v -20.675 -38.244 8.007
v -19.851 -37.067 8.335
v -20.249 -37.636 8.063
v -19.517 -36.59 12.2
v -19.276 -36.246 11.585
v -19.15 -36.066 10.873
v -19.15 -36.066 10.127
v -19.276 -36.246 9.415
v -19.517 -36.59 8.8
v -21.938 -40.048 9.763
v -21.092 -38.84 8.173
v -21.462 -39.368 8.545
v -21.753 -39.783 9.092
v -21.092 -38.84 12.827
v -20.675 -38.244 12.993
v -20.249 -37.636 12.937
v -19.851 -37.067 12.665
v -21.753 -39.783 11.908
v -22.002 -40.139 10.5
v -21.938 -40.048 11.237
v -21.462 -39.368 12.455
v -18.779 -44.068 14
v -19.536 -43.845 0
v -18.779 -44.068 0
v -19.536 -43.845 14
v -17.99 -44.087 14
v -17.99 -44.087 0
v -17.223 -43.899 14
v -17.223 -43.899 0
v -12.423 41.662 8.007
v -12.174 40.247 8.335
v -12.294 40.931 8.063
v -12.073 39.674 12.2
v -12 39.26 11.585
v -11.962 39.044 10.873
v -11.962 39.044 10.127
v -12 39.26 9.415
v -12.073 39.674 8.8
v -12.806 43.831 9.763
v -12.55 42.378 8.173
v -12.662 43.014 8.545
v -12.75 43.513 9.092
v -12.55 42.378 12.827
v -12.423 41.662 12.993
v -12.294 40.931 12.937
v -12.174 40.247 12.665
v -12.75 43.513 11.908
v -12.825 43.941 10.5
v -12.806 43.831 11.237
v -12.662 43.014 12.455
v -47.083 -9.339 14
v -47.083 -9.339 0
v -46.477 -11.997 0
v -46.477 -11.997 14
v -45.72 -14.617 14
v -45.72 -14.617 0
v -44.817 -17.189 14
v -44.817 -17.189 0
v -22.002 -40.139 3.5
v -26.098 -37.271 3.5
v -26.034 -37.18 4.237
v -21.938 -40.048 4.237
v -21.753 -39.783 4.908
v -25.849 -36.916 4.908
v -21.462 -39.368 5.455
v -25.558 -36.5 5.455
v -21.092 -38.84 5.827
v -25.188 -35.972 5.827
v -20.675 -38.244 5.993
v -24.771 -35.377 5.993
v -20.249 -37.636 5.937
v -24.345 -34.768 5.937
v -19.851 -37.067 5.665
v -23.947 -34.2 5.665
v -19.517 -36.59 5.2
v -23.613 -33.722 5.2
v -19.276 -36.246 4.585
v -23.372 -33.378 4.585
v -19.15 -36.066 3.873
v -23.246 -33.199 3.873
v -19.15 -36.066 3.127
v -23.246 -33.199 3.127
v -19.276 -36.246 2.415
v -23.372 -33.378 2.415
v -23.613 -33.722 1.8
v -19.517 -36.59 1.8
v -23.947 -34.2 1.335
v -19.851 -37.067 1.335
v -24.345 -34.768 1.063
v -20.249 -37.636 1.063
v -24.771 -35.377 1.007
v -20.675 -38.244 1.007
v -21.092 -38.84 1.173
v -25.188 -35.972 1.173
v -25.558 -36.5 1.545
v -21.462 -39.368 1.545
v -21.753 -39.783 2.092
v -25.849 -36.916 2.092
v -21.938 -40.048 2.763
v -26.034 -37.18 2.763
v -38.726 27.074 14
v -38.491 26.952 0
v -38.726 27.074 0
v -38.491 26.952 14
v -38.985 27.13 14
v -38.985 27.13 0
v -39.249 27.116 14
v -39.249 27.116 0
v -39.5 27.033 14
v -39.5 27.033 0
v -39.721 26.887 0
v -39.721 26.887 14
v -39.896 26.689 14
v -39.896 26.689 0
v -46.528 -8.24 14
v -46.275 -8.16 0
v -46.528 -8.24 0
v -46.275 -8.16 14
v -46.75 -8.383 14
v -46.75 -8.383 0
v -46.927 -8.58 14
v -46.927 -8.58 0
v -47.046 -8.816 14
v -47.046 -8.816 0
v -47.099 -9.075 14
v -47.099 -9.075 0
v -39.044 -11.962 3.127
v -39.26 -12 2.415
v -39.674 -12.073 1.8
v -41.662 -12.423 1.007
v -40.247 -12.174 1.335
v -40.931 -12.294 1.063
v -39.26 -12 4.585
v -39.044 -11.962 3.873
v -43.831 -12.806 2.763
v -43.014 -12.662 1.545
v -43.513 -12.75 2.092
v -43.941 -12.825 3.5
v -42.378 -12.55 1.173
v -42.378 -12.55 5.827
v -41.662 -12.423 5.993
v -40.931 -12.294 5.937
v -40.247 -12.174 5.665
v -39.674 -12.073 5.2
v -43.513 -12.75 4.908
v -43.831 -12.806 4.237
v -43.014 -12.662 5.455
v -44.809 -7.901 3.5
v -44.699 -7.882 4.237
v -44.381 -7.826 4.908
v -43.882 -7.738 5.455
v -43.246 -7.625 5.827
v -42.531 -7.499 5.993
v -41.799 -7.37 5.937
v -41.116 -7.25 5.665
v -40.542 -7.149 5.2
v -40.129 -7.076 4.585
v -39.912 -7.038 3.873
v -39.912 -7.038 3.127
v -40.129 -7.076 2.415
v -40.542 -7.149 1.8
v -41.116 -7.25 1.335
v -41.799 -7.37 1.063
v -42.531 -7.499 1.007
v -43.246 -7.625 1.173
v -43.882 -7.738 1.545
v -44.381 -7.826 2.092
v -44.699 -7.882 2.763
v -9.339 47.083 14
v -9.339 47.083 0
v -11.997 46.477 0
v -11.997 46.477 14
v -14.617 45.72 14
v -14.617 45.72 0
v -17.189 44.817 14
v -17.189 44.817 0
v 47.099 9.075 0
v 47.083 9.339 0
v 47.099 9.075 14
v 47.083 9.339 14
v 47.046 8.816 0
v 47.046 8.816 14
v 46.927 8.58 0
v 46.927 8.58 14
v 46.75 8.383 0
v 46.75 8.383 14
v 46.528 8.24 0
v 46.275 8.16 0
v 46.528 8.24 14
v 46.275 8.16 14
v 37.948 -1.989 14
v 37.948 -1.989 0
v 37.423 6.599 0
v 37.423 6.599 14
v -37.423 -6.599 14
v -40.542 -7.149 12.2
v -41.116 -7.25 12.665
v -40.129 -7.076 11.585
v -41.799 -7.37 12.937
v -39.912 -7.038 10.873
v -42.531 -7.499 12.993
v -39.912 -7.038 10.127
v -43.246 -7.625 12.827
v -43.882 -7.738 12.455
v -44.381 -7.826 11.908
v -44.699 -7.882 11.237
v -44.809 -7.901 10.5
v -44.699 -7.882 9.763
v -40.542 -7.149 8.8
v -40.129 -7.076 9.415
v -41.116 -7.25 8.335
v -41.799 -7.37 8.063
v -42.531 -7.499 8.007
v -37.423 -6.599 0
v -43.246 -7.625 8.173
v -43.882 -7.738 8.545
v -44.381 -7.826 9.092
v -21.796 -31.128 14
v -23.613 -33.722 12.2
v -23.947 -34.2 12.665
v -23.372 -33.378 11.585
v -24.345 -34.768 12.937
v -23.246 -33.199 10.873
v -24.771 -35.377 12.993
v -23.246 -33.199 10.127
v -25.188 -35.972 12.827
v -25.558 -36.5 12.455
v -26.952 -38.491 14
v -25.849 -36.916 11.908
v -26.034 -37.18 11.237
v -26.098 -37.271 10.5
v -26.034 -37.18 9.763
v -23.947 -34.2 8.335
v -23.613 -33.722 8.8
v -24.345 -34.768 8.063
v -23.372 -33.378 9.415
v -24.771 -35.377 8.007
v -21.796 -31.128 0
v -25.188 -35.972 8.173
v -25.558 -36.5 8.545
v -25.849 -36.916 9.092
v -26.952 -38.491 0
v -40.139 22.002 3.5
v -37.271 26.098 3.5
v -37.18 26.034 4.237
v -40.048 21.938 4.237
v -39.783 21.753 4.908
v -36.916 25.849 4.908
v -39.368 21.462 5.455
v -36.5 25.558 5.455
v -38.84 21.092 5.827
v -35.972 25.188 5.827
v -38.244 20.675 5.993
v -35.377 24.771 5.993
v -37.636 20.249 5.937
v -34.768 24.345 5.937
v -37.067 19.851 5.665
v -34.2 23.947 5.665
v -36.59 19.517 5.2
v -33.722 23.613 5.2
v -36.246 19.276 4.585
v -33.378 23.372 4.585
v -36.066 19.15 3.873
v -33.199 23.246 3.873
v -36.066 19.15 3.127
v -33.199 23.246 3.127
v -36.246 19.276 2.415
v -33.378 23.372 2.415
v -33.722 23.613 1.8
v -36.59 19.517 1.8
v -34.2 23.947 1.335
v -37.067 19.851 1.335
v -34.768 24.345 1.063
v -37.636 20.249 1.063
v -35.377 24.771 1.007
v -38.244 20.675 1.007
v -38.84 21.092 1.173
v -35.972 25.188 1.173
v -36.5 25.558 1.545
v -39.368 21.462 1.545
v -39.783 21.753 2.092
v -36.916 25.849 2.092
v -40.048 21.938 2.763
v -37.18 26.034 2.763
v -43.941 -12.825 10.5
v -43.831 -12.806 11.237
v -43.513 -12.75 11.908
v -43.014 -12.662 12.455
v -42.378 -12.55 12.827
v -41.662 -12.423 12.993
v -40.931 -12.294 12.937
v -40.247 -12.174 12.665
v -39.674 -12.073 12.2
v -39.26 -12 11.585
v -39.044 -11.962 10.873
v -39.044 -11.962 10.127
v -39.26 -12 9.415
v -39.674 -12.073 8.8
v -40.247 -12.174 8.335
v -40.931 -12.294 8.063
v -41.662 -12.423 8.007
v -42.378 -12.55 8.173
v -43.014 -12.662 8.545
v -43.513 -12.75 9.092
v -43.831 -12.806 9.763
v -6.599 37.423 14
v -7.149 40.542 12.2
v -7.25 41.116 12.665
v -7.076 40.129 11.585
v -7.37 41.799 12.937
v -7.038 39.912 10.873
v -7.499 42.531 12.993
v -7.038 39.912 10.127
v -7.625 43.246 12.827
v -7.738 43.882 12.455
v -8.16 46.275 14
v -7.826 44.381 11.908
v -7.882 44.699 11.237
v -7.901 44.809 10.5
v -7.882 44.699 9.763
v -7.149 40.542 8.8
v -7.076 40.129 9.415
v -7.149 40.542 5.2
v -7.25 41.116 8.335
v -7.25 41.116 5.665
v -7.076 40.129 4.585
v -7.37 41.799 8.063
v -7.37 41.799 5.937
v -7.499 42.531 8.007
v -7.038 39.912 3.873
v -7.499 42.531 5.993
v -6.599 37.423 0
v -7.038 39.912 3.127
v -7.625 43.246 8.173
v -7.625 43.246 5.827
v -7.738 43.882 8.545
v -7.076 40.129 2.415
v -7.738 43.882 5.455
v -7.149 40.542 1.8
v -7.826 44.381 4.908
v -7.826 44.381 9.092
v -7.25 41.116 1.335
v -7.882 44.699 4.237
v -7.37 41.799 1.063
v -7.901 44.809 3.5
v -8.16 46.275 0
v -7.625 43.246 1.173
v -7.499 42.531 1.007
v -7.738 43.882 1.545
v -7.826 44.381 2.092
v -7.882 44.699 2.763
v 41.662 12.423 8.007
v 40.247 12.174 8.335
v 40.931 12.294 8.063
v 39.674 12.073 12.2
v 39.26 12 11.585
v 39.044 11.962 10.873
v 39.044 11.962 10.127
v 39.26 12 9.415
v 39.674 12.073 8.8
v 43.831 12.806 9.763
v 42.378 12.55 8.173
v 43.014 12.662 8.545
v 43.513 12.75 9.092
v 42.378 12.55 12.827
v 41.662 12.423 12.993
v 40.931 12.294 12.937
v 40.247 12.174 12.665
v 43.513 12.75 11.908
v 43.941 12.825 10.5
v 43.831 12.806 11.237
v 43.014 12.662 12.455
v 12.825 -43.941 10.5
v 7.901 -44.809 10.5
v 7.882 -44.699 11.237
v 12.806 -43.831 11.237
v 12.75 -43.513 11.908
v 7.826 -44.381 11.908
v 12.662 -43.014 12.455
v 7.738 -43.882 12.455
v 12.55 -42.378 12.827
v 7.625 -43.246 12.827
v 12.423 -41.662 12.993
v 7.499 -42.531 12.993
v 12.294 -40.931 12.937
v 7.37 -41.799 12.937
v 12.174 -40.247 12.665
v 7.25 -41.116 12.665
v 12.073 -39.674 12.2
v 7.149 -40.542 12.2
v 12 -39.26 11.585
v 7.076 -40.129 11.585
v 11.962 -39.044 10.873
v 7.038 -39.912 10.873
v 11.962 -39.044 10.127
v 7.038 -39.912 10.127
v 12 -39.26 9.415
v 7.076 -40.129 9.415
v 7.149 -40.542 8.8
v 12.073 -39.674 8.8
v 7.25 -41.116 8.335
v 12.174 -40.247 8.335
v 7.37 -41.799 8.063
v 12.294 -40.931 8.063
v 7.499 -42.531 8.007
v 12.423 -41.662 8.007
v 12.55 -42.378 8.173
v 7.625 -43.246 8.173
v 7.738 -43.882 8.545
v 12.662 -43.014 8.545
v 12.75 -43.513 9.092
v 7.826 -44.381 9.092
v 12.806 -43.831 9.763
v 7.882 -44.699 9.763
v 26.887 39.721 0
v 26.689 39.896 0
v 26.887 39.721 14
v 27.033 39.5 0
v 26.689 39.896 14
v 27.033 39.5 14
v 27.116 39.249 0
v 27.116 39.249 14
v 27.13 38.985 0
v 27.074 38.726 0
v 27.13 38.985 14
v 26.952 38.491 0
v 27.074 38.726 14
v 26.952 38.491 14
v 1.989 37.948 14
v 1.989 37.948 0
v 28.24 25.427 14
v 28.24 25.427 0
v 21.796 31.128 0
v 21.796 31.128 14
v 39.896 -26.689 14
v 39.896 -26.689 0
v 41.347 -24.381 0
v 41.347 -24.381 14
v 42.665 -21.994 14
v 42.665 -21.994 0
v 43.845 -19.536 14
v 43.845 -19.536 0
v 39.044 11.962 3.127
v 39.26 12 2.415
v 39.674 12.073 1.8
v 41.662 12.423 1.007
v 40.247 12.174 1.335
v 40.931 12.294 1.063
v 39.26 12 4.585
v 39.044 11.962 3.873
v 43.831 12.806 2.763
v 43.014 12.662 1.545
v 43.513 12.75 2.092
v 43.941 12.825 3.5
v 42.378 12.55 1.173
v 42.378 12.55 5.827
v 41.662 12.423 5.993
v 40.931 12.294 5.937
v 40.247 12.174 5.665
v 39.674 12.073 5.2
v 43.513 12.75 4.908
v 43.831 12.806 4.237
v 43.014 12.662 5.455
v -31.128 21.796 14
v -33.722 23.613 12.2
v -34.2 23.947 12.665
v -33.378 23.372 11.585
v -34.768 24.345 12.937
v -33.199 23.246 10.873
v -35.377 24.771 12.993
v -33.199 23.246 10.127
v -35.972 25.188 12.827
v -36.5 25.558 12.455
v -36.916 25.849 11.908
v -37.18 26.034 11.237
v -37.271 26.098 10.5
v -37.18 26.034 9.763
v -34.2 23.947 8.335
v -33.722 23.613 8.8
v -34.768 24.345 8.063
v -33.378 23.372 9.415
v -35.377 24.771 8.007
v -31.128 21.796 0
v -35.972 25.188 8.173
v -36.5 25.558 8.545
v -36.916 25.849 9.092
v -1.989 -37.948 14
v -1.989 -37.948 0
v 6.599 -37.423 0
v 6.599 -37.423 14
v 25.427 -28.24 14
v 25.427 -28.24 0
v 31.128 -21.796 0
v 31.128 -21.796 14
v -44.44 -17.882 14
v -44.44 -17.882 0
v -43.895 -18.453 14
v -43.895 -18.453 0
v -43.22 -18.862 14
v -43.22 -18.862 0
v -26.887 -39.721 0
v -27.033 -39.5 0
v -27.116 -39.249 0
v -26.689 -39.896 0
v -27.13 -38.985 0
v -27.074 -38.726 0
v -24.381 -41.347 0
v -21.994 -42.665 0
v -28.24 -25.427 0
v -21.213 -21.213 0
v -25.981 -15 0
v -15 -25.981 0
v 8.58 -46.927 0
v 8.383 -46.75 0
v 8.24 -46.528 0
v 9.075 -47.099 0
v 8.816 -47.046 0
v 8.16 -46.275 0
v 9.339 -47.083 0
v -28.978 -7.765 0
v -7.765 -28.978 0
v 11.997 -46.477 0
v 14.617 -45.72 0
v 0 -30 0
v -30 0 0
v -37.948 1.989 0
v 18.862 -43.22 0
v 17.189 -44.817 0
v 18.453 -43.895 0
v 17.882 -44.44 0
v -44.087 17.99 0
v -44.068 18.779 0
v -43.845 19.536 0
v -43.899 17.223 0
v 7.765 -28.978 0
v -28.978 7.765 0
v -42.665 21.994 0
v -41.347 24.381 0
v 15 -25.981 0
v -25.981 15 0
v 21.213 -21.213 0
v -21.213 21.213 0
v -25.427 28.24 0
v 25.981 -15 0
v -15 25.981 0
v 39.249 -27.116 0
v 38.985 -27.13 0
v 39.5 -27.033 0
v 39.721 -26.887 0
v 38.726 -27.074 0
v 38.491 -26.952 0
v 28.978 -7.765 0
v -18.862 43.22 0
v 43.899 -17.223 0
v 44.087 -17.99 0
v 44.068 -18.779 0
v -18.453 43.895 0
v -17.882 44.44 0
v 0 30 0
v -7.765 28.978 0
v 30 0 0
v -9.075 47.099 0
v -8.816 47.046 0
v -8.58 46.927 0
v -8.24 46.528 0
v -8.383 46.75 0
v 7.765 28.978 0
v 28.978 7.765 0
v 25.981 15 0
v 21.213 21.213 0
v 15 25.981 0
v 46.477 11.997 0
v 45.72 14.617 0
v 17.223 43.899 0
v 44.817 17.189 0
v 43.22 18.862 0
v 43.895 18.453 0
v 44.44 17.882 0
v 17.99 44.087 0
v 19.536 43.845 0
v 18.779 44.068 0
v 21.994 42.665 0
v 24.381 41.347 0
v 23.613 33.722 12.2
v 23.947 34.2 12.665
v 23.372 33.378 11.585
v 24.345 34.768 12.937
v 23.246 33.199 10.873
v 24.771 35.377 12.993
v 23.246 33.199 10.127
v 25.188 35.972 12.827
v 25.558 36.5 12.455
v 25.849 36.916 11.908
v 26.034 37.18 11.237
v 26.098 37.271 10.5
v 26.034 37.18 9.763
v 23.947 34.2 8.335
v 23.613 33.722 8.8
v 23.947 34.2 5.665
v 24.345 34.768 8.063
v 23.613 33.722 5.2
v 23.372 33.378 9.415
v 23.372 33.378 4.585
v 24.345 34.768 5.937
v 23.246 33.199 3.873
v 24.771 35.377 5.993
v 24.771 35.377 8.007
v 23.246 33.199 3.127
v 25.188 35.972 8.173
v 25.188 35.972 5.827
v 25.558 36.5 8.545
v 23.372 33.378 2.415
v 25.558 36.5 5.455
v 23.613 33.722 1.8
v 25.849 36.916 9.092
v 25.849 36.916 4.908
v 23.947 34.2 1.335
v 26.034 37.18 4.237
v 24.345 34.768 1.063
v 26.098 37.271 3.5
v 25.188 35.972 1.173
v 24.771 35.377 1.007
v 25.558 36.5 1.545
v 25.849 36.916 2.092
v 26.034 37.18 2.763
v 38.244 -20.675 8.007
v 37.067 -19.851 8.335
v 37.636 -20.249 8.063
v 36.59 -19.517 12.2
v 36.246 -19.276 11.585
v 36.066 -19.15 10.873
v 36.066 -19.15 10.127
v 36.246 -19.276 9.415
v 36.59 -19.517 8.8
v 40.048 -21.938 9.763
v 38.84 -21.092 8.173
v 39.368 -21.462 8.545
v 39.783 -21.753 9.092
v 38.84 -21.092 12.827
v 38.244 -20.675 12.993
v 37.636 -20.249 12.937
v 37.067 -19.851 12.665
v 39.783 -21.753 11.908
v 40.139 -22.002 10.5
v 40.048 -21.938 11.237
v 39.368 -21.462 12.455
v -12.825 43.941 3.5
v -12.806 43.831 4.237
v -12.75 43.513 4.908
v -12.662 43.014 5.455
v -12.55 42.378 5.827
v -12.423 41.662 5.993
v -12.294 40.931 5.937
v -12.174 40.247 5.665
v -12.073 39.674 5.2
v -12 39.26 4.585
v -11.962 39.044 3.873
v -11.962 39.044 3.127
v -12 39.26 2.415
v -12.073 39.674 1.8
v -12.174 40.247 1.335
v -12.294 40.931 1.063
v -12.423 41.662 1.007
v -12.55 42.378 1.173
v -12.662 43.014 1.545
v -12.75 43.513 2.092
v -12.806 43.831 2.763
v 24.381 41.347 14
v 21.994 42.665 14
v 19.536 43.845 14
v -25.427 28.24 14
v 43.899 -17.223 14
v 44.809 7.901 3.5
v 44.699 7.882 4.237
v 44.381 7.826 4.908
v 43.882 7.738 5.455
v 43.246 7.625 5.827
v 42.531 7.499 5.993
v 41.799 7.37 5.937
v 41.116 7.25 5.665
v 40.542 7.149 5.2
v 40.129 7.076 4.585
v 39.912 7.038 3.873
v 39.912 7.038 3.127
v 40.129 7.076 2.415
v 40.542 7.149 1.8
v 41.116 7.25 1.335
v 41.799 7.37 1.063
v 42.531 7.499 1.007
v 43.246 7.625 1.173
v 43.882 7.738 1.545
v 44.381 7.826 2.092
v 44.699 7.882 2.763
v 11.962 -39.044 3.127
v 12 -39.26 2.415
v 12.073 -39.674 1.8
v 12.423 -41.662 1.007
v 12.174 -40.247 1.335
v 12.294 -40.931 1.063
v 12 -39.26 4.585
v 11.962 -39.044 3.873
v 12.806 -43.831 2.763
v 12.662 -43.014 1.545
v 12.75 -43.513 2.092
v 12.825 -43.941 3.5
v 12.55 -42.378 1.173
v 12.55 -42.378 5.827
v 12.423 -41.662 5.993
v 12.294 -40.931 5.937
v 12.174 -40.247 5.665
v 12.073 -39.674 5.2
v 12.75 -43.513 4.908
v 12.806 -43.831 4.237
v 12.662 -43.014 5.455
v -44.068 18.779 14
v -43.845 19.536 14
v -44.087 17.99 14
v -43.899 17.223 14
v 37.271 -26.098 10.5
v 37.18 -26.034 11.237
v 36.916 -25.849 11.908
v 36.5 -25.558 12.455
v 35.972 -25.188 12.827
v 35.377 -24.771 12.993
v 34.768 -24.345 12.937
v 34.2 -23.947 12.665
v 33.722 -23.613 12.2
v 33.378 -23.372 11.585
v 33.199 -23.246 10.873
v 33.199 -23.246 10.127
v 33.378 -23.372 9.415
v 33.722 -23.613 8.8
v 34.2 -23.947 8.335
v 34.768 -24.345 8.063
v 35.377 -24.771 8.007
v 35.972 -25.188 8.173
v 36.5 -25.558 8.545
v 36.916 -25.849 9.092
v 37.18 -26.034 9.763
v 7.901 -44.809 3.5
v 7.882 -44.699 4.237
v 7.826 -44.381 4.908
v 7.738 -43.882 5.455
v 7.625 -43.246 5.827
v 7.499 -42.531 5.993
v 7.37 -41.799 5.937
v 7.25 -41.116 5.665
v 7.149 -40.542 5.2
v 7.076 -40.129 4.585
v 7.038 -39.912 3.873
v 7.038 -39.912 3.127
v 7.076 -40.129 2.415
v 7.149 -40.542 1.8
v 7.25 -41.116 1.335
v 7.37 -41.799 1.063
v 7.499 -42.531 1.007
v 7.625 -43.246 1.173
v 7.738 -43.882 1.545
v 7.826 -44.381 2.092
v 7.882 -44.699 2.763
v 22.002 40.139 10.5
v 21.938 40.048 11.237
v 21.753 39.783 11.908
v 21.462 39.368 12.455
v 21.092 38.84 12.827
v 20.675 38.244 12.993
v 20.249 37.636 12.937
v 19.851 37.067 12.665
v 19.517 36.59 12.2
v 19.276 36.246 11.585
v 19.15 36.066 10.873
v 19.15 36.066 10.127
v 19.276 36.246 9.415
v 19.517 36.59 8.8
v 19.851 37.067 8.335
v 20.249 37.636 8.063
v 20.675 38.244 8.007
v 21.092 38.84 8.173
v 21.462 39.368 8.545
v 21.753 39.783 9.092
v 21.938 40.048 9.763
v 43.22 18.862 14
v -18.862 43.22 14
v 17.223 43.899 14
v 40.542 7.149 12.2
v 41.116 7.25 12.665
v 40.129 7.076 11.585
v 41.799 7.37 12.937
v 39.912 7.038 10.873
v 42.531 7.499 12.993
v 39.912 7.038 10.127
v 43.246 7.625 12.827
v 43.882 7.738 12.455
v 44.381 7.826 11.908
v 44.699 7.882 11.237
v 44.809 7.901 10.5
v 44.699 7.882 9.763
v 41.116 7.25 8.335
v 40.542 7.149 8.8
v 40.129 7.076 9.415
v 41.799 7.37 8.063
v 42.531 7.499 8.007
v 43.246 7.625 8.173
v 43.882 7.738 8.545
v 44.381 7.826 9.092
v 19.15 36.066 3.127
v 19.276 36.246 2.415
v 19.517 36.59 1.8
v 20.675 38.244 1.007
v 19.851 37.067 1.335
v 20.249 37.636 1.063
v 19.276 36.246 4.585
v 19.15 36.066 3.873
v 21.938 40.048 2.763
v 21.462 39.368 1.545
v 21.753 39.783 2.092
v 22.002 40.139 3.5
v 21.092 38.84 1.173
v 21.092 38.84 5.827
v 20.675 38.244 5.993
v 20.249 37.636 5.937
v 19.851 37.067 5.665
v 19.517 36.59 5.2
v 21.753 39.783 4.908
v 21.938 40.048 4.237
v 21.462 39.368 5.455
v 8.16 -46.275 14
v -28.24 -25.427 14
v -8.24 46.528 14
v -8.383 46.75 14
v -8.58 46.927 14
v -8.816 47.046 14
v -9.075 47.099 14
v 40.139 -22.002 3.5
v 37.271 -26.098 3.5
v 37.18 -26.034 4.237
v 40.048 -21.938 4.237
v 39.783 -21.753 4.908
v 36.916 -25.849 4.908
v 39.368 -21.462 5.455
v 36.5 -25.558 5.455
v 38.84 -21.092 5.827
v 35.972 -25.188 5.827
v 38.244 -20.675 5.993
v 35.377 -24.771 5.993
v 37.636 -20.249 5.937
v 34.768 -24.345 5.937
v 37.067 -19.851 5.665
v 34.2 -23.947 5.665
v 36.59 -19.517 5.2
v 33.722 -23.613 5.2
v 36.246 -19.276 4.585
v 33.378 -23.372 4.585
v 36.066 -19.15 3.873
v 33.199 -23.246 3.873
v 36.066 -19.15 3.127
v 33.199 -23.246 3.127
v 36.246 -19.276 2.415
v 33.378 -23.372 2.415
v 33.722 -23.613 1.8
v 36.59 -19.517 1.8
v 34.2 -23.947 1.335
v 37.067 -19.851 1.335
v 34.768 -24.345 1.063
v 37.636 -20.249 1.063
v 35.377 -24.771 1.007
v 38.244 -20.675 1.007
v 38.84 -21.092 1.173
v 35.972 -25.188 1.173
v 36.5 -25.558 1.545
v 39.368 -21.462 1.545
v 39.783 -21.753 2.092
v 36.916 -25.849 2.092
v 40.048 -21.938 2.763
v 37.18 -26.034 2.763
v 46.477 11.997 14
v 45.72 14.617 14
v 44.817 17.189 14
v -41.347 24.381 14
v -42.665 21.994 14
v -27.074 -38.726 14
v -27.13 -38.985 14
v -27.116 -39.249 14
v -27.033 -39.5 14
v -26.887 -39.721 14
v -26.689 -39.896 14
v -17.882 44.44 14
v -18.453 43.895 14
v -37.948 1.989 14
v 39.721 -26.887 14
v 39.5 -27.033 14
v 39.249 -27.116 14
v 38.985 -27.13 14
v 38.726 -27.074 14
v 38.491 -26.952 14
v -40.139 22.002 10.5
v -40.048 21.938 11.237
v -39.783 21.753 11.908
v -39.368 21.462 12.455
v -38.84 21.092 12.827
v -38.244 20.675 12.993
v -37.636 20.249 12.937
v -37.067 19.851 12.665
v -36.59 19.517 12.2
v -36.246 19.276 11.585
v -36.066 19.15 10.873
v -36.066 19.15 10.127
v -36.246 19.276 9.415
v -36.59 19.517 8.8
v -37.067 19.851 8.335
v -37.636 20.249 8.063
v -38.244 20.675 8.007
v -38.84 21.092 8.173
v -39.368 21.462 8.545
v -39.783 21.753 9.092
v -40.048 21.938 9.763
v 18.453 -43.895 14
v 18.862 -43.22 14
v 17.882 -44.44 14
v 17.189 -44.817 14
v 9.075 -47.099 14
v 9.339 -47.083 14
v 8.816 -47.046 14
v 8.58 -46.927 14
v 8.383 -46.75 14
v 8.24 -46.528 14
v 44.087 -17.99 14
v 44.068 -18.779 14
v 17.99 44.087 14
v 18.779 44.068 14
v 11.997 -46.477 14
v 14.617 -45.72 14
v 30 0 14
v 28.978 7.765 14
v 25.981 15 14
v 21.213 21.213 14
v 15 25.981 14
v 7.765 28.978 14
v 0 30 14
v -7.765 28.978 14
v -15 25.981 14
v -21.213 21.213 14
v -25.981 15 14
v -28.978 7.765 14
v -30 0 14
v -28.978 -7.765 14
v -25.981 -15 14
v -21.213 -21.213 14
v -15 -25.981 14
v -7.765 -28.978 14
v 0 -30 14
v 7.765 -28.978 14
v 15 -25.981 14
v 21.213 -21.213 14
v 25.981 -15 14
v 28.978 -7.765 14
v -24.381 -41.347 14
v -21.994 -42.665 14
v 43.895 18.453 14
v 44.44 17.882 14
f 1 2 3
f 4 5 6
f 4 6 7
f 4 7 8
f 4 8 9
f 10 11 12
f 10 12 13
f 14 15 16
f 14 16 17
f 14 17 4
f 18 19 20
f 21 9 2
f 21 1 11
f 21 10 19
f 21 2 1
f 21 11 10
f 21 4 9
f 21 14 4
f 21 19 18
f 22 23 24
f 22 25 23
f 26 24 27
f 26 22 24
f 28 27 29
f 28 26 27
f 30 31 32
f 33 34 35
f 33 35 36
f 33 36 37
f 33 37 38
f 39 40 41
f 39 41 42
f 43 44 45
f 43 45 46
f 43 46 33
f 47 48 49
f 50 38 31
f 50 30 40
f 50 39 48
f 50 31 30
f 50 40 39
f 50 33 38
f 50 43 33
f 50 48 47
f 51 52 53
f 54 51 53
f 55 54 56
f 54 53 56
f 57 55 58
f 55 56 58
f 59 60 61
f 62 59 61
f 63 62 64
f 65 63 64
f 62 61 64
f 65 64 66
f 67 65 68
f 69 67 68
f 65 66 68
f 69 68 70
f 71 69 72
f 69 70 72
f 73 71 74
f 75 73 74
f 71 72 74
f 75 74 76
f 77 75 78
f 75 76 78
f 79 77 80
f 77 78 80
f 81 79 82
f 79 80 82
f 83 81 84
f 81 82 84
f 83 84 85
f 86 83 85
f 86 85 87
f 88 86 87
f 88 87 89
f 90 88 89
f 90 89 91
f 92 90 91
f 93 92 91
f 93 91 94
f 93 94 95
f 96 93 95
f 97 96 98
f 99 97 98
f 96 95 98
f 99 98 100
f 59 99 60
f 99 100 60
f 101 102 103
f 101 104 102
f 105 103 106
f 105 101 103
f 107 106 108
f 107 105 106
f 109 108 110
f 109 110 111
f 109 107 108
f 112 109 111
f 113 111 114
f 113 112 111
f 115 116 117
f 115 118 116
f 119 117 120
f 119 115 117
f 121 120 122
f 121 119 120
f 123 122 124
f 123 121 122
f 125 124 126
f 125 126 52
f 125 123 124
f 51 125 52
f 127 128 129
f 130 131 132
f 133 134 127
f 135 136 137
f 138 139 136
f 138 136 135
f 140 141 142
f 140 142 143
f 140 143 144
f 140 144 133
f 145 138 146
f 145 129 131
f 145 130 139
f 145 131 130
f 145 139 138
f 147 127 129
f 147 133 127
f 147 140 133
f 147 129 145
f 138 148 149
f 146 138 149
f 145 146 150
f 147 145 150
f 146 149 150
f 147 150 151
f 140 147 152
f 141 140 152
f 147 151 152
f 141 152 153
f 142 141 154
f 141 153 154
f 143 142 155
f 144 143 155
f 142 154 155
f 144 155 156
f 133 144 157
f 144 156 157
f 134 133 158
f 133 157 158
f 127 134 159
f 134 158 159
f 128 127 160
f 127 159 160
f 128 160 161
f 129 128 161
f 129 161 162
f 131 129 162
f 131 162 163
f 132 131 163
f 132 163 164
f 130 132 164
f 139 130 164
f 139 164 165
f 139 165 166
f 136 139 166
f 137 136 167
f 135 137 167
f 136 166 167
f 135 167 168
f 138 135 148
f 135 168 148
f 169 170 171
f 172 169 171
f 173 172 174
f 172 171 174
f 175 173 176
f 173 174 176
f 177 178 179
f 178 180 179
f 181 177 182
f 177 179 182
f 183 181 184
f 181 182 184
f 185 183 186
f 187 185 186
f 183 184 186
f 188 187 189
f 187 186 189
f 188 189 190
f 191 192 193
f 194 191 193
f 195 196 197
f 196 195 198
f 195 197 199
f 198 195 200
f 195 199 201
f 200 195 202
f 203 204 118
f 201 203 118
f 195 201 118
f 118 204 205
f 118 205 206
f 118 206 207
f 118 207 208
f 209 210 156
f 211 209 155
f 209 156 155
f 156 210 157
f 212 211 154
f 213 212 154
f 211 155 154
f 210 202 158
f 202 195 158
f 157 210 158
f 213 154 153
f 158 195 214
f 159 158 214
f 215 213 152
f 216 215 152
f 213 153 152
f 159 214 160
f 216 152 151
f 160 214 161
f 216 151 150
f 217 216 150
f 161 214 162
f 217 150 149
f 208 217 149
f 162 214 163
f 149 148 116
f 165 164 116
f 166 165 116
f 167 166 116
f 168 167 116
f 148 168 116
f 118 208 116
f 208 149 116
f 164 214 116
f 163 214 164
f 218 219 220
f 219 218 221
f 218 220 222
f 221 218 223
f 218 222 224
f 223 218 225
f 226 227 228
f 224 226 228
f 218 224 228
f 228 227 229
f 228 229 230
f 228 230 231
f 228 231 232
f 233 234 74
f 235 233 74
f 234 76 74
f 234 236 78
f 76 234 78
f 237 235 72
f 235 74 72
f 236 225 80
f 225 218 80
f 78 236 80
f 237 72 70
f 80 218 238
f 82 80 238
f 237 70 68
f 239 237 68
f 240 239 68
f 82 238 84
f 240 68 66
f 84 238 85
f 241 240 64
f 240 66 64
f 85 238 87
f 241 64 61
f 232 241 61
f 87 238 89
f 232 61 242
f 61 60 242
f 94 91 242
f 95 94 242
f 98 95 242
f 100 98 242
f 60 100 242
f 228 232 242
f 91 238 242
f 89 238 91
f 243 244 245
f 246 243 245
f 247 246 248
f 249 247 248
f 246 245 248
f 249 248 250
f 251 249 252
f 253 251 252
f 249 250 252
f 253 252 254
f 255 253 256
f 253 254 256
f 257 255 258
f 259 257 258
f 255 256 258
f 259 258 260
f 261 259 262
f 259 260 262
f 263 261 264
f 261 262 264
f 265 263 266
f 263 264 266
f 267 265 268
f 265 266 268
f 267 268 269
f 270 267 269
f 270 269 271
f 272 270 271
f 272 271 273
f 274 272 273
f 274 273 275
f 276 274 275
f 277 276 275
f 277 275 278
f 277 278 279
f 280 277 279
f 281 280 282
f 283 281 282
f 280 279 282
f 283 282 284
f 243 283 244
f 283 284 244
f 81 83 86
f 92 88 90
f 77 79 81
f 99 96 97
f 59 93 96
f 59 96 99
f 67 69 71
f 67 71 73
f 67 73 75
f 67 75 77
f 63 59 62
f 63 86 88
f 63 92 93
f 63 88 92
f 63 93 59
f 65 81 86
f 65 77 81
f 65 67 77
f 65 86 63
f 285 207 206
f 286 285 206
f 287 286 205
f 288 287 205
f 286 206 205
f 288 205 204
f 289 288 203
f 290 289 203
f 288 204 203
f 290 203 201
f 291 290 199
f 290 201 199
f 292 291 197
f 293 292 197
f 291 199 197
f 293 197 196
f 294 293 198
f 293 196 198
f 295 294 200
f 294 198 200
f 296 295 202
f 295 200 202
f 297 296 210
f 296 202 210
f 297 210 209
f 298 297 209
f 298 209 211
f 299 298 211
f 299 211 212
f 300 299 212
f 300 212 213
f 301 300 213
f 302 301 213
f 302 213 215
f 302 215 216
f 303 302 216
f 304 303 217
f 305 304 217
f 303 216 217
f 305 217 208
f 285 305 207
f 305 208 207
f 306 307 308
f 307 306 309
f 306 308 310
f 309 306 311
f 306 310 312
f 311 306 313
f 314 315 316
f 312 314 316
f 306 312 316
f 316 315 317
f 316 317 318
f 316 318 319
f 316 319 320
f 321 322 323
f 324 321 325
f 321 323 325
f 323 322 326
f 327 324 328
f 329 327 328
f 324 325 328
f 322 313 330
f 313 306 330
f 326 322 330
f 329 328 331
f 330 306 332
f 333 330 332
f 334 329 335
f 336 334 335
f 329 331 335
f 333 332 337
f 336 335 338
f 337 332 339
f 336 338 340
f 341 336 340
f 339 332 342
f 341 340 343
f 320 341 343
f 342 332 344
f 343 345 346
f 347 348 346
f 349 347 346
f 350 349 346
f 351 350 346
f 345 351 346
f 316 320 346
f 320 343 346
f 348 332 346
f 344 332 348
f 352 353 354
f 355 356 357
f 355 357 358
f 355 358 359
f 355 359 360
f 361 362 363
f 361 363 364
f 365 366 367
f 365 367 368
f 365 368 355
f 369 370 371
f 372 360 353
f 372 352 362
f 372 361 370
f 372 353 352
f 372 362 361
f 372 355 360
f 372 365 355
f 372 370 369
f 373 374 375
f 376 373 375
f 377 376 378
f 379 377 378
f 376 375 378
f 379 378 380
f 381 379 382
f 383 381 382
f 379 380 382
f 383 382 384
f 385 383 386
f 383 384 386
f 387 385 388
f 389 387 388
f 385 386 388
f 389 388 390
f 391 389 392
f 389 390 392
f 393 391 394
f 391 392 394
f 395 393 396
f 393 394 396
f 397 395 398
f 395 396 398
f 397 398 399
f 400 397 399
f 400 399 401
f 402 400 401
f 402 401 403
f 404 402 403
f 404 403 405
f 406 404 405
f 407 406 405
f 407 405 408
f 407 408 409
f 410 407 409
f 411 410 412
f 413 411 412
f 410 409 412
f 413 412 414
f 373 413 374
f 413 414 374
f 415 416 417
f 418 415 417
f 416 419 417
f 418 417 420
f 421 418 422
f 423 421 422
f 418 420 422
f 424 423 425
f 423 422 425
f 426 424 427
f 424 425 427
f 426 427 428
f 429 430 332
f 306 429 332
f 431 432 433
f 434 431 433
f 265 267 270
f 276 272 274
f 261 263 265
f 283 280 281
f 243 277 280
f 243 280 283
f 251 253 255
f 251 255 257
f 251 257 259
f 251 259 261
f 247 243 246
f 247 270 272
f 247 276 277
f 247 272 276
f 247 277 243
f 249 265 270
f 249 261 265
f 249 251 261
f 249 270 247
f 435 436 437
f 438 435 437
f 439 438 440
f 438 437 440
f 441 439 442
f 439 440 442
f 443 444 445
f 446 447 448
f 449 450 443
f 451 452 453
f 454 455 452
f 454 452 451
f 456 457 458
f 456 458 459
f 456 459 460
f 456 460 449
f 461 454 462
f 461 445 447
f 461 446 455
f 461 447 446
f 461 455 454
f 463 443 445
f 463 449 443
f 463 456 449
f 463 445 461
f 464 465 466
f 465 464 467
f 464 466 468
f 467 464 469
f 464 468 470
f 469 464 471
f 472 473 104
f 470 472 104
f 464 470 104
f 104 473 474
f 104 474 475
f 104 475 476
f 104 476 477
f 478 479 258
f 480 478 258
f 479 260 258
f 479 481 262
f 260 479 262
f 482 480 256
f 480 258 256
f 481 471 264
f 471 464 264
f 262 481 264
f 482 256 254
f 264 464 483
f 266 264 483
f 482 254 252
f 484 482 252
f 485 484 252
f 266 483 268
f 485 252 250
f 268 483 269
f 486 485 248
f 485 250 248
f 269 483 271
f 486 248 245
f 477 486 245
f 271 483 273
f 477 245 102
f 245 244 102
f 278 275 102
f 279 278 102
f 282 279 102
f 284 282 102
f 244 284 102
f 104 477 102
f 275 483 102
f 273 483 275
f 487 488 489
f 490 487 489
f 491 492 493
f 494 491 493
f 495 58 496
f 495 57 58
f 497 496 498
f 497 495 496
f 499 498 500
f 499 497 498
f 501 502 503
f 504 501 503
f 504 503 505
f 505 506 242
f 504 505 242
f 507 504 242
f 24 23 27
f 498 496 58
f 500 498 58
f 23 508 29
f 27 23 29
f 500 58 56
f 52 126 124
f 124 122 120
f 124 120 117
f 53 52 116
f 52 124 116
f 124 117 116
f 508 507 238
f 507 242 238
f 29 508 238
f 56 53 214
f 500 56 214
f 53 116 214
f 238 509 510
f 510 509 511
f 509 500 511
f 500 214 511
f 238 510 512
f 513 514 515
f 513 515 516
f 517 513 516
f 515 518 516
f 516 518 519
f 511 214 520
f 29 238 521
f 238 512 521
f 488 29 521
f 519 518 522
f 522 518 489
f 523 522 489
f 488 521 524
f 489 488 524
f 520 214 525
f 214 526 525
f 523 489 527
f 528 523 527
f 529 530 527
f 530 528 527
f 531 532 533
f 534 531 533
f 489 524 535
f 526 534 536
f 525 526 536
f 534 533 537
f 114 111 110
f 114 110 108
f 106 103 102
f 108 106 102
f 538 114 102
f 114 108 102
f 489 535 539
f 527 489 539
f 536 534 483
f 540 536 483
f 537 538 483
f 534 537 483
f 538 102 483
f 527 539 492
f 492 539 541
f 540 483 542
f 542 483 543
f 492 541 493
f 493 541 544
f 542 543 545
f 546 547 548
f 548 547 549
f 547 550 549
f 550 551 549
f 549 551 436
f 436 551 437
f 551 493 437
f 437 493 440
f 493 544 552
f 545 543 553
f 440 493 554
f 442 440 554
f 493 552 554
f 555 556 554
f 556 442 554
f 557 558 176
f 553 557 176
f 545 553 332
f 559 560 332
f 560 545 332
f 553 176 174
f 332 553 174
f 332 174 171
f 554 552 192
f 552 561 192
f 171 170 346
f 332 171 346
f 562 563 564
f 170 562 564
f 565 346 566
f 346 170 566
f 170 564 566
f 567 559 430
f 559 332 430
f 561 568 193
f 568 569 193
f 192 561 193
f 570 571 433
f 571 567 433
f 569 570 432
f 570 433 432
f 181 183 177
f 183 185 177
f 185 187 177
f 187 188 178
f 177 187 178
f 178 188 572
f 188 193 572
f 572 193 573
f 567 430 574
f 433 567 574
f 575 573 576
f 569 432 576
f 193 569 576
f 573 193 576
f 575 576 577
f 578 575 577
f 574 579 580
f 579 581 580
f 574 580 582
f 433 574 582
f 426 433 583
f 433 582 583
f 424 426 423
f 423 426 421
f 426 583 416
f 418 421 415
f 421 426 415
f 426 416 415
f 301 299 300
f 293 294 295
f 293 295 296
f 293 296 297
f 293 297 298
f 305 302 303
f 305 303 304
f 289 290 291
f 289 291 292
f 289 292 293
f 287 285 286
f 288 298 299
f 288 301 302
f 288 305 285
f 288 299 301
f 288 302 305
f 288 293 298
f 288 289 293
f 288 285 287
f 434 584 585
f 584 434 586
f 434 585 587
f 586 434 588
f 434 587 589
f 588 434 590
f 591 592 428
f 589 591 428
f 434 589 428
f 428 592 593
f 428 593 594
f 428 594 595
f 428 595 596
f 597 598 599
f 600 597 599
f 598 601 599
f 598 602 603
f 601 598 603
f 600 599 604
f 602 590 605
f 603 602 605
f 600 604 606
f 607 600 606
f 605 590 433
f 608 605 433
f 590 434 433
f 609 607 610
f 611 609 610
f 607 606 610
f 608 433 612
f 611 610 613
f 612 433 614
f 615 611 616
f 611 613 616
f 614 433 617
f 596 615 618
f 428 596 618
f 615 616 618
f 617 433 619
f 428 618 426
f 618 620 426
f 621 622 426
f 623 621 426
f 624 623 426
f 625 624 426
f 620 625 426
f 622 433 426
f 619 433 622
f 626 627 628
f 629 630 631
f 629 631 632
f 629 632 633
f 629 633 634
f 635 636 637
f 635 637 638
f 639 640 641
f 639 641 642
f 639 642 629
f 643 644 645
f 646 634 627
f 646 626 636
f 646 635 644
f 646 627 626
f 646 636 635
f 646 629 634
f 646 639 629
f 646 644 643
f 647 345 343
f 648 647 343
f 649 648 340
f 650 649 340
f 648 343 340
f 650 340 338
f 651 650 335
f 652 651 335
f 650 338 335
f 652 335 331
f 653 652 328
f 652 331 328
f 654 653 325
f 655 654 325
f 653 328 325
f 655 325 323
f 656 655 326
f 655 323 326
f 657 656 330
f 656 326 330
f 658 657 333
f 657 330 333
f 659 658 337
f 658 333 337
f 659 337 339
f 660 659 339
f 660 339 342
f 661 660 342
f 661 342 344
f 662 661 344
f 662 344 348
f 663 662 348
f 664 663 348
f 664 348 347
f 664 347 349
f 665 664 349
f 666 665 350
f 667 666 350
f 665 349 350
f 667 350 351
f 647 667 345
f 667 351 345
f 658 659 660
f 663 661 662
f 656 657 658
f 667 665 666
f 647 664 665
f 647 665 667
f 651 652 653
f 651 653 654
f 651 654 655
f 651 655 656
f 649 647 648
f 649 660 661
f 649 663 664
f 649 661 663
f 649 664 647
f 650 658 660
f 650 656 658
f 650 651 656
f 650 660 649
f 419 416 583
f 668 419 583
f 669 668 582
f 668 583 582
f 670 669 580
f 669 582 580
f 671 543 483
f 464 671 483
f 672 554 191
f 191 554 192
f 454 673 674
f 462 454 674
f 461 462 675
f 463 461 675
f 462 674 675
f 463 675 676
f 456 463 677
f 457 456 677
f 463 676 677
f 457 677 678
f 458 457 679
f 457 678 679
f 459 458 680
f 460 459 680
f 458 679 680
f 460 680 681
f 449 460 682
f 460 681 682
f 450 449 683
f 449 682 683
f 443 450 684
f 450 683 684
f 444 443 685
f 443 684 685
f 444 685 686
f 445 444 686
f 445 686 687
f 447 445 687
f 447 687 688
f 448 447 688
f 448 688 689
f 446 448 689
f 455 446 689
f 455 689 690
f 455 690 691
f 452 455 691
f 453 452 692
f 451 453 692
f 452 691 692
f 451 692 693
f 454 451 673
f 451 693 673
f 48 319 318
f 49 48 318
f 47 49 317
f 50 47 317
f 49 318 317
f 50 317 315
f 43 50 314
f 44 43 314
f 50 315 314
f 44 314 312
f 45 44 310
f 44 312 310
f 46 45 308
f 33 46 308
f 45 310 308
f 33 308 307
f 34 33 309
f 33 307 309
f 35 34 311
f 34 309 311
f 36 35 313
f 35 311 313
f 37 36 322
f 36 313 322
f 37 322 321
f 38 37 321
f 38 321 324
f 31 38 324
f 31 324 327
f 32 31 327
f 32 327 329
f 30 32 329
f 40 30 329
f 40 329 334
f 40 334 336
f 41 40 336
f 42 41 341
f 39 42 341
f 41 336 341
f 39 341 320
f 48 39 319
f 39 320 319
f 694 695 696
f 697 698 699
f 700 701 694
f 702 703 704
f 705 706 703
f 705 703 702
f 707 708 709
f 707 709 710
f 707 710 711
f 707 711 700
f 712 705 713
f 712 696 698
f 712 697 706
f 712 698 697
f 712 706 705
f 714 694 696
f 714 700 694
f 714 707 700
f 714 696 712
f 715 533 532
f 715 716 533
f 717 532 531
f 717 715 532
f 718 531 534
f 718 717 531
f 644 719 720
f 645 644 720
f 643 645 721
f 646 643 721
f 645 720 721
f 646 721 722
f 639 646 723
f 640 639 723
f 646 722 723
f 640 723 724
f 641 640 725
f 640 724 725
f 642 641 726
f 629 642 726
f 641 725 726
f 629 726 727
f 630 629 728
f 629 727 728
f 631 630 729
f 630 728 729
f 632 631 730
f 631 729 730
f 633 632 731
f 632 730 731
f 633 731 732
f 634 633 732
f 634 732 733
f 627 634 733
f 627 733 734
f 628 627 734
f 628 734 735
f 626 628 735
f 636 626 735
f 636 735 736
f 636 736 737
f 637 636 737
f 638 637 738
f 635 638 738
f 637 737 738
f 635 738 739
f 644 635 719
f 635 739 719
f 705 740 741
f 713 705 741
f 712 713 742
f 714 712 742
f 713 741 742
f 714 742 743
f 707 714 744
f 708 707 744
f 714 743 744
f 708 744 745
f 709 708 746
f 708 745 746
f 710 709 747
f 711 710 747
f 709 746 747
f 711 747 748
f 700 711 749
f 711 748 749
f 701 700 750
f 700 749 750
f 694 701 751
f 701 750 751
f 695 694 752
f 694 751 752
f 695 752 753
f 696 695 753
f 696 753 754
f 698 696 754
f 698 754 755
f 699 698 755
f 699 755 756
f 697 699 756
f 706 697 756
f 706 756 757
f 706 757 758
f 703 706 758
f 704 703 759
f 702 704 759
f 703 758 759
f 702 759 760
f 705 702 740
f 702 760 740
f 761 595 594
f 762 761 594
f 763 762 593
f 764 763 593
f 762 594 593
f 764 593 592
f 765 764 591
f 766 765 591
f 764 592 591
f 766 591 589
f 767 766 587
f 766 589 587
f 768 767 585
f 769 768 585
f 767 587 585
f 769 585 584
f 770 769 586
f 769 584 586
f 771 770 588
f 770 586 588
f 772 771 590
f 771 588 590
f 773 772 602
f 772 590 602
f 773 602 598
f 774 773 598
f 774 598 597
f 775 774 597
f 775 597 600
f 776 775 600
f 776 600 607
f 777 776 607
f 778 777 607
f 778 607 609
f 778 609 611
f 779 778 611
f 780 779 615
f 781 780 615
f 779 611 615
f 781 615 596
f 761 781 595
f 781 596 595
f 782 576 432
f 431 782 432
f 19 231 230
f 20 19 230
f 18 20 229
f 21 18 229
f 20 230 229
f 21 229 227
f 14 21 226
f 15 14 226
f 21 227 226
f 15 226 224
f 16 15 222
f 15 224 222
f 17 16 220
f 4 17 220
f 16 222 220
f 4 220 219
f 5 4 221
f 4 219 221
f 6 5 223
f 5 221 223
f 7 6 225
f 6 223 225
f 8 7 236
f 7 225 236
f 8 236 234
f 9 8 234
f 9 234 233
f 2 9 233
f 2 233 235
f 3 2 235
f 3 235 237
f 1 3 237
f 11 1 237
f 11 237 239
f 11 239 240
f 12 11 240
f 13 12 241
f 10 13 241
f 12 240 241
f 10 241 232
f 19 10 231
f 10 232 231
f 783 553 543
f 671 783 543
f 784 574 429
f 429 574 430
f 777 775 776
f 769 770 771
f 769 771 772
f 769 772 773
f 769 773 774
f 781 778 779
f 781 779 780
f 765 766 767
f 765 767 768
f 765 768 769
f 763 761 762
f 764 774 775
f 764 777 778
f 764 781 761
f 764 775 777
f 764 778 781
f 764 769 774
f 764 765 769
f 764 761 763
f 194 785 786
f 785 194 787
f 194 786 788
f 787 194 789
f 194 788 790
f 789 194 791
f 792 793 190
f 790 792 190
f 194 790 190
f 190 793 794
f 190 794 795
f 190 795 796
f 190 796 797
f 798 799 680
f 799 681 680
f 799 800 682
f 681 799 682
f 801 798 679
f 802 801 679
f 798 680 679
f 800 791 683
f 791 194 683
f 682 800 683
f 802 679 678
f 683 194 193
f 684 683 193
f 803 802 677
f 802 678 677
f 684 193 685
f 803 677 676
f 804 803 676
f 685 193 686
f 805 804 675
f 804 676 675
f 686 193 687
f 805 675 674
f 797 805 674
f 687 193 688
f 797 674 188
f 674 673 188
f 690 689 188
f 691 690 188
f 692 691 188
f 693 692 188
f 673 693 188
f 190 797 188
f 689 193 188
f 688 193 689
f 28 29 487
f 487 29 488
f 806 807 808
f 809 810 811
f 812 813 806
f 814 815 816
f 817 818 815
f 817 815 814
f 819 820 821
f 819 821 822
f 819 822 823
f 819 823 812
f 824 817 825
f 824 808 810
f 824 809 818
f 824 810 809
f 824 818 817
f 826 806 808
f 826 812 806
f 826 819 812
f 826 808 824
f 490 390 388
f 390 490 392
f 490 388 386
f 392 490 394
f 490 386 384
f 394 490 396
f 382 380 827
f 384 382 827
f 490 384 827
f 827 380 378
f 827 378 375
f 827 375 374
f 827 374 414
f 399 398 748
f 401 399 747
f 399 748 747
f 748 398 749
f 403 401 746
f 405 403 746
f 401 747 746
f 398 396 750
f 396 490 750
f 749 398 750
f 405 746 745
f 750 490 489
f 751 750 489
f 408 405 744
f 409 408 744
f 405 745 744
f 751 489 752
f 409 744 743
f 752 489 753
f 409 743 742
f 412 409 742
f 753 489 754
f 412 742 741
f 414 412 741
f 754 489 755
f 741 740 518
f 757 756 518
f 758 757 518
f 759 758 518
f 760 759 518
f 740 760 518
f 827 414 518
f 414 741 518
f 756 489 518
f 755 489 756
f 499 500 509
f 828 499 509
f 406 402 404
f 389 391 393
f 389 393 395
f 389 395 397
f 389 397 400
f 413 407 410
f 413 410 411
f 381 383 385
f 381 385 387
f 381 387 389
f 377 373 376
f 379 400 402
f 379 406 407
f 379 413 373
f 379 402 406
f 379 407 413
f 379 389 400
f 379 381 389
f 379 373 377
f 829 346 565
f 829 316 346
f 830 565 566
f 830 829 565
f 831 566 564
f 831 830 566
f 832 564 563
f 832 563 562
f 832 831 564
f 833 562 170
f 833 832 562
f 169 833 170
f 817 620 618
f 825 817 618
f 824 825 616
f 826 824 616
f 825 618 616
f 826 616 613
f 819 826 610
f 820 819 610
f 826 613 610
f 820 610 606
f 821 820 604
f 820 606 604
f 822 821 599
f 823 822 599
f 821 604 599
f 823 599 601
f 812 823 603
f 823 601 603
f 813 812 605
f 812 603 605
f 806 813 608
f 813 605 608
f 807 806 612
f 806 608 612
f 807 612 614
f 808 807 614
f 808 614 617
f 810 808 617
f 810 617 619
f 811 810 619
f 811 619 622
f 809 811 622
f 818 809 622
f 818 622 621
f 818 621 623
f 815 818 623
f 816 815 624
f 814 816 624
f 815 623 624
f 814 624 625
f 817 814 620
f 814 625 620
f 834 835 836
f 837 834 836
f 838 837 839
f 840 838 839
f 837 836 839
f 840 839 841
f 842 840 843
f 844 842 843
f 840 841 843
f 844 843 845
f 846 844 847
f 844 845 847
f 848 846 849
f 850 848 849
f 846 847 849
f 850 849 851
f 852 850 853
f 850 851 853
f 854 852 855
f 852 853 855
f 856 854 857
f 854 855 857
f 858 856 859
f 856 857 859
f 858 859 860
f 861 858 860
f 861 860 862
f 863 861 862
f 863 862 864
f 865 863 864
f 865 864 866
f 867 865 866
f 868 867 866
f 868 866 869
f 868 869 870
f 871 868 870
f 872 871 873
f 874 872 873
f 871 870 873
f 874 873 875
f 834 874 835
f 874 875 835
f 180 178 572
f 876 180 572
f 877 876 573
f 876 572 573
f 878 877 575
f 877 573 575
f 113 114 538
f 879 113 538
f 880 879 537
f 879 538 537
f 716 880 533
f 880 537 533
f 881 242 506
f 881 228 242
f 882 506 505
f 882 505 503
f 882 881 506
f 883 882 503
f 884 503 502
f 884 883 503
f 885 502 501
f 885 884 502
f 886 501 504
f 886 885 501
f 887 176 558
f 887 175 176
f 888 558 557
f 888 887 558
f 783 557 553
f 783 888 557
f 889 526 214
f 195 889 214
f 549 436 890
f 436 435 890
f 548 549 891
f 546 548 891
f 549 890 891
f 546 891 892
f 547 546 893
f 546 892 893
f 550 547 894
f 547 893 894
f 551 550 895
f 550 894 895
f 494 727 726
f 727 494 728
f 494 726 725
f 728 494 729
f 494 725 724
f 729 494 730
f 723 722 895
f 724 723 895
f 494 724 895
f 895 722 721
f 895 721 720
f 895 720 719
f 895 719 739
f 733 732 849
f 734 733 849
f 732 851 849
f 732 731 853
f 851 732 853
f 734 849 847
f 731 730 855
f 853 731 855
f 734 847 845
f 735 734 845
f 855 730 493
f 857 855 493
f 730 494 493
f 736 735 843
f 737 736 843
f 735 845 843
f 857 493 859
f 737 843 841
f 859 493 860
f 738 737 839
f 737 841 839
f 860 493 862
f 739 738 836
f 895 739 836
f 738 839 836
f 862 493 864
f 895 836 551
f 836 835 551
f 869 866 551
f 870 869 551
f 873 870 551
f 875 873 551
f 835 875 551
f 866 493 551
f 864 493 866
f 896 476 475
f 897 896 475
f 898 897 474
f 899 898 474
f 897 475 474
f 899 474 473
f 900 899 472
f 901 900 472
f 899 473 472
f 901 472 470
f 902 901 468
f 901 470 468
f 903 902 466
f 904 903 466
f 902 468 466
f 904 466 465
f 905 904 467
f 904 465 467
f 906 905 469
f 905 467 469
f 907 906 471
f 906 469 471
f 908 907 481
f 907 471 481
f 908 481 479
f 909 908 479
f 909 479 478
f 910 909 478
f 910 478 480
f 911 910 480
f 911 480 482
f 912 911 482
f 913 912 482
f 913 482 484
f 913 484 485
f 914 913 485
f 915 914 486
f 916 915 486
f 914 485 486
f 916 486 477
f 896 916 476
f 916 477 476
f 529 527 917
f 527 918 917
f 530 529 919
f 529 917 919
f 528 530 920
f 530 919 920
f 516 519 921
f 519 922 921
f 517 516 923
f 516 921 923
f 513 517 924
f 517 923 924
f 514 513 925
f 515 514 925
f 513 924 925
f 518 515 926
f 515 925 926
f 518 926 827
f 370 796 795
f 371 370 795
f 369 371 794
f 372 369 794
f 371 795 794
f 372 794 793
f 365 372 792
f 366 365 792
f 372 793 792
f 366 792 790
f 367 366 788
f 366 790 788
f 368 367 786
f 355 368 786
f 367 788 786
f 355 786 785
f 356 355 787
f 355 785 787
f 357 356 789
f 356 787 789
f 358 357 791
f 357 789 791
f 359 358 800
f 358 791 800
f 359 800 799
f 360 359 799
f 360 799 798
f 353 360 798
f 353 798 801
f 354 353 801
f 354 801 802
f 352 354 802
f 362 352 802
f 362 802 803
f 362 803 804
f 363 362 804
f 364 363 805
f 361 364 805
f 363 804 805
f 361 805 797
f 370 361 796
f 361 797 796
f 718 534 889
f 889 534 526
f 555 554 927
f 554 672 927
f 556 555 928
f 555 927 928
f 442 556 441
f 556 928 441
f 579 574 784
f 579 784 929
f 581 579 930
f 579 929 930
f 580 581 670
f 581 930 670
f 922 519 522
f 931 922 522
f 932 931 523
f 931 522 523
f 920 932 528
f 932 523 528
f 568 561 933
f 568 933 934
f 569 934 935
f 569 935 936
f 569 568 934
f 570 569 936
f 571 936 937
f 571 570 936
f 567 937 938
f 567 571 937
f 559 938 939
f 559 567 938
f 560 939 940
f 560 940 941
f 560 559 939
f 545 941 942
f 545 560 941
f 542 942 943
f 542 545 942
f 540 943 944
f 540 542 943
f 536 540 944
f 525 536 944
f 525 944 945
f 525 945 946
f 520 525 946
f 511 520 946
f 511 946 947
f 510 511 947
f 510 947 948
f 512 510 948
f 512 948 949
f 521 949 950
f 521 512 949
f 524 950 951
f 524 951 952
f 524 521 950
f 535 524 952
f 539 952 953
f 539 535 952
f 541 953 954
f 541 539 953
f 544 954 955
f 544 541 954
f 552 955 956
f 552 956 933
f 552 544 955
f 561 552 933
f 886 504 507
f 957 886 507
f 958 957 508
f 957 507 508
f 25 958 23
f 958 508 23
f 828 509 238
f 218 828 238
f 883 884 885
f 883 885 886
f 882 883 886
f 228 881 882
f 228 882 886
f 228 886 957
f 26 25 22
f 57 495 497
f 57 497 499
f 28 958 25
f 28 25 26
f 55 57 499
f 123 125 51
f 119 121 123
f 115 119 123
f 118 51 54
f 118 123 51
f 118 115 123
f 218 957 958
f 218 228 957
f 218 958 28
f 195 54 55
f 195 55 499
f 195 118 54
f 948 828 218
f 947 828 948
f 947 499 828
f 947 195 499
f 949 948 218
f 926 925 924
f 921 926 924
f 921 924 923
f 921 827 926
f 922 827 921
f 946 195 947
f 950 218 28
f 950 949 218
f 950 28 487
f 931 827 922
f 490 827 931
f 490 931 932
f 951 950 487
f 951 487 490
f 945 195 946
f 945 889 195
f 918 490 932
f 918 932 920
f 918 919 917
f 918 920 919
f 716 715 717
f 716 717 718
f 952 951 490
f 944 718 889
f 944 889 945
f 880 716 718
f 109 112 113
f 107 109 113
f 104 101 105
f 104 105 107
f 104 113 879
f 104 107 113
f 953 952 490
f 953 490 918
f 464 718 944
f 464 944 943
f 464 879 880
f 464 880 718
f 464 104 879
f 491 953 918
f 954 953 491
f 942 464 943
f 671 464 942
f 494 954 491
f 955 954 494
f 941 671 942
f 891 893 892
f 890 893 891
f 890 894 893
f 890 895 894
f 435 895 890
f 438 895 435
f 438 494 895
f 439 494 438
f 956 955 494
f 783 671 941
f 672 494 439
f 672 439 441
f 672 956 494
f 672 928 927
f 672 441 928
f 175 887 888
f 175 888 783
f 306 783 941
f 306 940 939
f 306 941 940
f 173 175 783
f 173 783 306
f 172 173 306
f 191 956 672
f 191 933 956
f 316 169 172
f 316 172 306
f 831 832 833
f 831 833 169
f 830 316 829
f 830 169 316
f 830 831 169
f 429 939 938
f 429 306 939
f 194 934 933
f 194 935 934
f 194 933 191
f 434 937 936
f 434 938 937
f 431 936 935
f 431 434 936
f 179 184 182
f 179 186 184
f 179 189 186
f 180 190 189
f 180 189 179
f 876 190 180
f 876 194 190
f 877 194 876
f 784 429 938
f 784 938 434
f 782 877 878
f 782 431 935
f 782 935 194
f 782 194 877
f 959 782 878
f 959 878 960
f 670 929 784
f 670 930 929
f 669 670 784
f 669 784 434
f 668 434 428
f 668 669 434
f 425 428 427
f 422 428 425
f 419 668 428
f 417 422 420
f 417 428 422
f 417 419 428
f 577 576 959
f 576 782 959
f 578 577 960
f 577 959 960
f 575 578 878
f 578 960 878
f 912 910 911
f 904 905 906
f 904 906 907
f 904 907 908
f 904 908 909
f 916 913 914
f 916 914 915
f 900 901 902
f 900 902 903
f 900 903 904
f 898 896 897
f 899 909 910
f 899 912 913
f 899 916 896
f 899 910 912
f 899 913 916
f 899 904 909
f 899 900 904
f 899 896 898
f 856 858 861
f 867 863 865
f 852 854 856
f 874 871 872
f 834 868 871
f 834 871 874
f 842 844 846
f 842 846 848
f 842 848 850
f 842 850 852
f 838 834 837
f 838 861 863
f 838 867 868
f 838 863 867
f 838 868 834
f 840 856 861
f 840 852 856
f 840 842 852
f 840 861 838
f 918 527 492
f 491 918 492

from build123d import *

# Parameters (mm, degrees)
SKETCH1_R           = 35
SKETCH1_R_2         = 30
BOSS_EXTRUDE2_DEPTH = 14
FILLET1_R           = 3
FILLET2_R           = 3
FILLET3_R           = 1
SKETCH2_R           = 2.5
CUT_EXTRUDE1_DEPTH  = 5
CIRPATTERN3_COUNT   = 8


with BuildPart() as part:
    # Sketch1 → Boss-Extrude2 (new body)
    # profile 1 of 2: a face of its own
    with BuildSketch(Plane.XY):
        with BuildLine():
            Line((-6.598630751, 37.422694614), (-8.335112528, 47.270772145))
            ThreePointArc((-8.335112528, 47.270772145), (-13.431792673, 46.082393011), (-18.368804754, 44.346217561))
            Line((-18.368804754, 44.346217561), (-25.426963042, 28.239503368))
            Line((-25.426963042, 28.239503368), (-31.127777683, 21.795904581))
            Line((-31.127777683, 21.795904581), (-39.319298126, 27.531668945))
            ThreePointArc((-39.319298126, 27.531668945), (-42.082884274, 23.087460908), (-44.346217561, 18.368804754))
            Line((-44.346217561, 18.368804754), (-37.947922321, 1.988766337))
            Line((-37.947922321, 1.988766337), (-37.422694614, -6.598630751))
            Line((-37.422694614, -6.598630751), (-47.270772145, -8.335112528))
            ThreePointArc((-47.270772145, -8.335112528), (-46.082393011, -13.431792673), (-44.346217561, -18.368804754))
            Line((-44.346217561, -18.368804754), (-28.239503368, -25.426963042))
            Line((-28.239503368, -25.426963042), (-21.795904581, -31.127777683))
            Line((-21.795904581, -31.127777683), (-27.531668945, -39.319298126))
            ThreePointArc((-27.531668945, -39.319298126), (-23.087460908, -42.082884274), (-18.368804754, -44.346217561))
            Line((-18.368804754, -44.346217561), (-1.988766337, -37.947922321))
            Line((-1.988766337, -37.947922321), (6.598630751, -37.422694614))
            Line((6.598630751, -37.422694614), (8.335112528, -47.270772145))
            ThreePointArc((8.335112528, -47.270772145), (13.431792673, -46.082393011), (18.368804754, -44.346217561))
            Line((18.368804754, -44.346217561), (25.426963042, -28.239503368))
            Line((25.426963042, -28.239503368), (31.127777683, -21.795904581))
            Line((31.127777683, -21.795904581), (39.319298126, -27.531668945))
            ThreePointArc((39.319298126, -27.531668945), (42.082884274, -23.087460908), (44.346217561, -18.368804754))
            Line((44.346217561, -18.368804754), (37.947922321, -1.988766337))
            Line((37.947922321, -1.988766337), (37.422694614, 6.598630751))
            Line((37.422694614, 6.598630751), (47.270772145, 8.335112528))
            ThreePointArc((47.270772145, 8.335112528), (46.082393011, 13.431792673), (44.346217561, 18.368804754))
            Line((44.346217561, 18.368804754), (28.239503368, 25.426963042))
            Line((28.239503368, 25.426963042), (21.795904581, 31.127777683))
            Line((21.795904581, 31.127777683), (27.531668945, 39.319298126))
            ThreePointArc((27.531668945, 39.319298126), (23.087460908, 42.082884274), (18.368804754, 44.346217561))
            Line((18.368804754, 44.346217561), (1.988766337, 37.947922321))
            Line((1.988766337, 37.947922321), (-6.598630751, 37.422694614))
        make_face()
        Circle(SKETCH1_R, mode=Mode.SUBTRACT)
    # profile 2 of 2: a face of its own
    with BuildSketch(Plane.XY):
        Circle(SKETCH1_R)
        Circle(SKETCH1_R_2, mode=Mode.SUBTRACT)
    extrude(amount=BOSS_EXTRUDE2_DEPTH)

    # Fillet1
    fillet1_edges = [part.edges().sort_by_distance(p)[0] for p in [
        (-18.368804754, 44.346217561, 7),
    ]]
    fillet(fillet1_edges, radius=FILLET1_R)

    # Fillet2
    fillet2_edges = [part.edges().sort_by_distance(p)[0] for p in [
        (44.346217561, -18.368804754, 7),
        (18.368804754, -44.346217561, 7),
        (-18.368804754, -44.346217561, 7),
        (-44.346217561, -18.368804754, 7),
        (-44.346217561, 18.368804754, 7),
        (18.368804754, 44.346217561, 7),
        (44.346217561, 18.368804754, 7),
    ]]
    fillet(fillet2_edges, radius=FILLET2_R)

    # Fillet3
    fillet3_edges = [part.edges().sort_by_distance(p)[0] for p in [
        (39.319298126, -27.531668945, 7),
        (8.335112528, -47.270772145, 7),
        (-27.531668945, -39.319298126, 7),
        (-47.270772145, -8.335112528, 7),
        (-39.319298126, 27.531668945, 7),
        (-8.335112528, 47.270772145, 7),
        (27.531668945, 39.319298126, 7),
        (47.270772145, 8.335112528, 7),
    ]]
    fillet(fillet3_edges, radius=FILLET3_R)

    # Sketch2 → Cut-Extrude1 (cut)
    with BuildSketch(Plane(origin=(0, 0, 0), x_dir=(0, 0, -1), z_dir=(0.8191520442889921, -0.5735764363510456, 0))):
        with Locations(Location((-3.5, 43, 0), (0, 0, 90))):
            Circle(SKETCH2_R)
        with Locations(Location((-10.5, 43, 0), (0, 0, 90))):
            Circle(SKETCH2_R)
    cut_extrude1 = extrude(amount=-CUT_EXTRUDE1_DEPTH, mode=Mode.SUBTRACT)

    # CirPattern3: Cut-Extrude1 ×8 about axis
    cirpattern3_axis = Axis((0, 0, 0), (0, 0, 1))
    for i in range(1, CIRPATTERN3_COUNT):
        add(cut_extrude1.rotate(cirpattern3_axis, i * 360 / CIRPATTERN3_COUNT), mode=Mode.SUBTRACT)


solid = part.part
